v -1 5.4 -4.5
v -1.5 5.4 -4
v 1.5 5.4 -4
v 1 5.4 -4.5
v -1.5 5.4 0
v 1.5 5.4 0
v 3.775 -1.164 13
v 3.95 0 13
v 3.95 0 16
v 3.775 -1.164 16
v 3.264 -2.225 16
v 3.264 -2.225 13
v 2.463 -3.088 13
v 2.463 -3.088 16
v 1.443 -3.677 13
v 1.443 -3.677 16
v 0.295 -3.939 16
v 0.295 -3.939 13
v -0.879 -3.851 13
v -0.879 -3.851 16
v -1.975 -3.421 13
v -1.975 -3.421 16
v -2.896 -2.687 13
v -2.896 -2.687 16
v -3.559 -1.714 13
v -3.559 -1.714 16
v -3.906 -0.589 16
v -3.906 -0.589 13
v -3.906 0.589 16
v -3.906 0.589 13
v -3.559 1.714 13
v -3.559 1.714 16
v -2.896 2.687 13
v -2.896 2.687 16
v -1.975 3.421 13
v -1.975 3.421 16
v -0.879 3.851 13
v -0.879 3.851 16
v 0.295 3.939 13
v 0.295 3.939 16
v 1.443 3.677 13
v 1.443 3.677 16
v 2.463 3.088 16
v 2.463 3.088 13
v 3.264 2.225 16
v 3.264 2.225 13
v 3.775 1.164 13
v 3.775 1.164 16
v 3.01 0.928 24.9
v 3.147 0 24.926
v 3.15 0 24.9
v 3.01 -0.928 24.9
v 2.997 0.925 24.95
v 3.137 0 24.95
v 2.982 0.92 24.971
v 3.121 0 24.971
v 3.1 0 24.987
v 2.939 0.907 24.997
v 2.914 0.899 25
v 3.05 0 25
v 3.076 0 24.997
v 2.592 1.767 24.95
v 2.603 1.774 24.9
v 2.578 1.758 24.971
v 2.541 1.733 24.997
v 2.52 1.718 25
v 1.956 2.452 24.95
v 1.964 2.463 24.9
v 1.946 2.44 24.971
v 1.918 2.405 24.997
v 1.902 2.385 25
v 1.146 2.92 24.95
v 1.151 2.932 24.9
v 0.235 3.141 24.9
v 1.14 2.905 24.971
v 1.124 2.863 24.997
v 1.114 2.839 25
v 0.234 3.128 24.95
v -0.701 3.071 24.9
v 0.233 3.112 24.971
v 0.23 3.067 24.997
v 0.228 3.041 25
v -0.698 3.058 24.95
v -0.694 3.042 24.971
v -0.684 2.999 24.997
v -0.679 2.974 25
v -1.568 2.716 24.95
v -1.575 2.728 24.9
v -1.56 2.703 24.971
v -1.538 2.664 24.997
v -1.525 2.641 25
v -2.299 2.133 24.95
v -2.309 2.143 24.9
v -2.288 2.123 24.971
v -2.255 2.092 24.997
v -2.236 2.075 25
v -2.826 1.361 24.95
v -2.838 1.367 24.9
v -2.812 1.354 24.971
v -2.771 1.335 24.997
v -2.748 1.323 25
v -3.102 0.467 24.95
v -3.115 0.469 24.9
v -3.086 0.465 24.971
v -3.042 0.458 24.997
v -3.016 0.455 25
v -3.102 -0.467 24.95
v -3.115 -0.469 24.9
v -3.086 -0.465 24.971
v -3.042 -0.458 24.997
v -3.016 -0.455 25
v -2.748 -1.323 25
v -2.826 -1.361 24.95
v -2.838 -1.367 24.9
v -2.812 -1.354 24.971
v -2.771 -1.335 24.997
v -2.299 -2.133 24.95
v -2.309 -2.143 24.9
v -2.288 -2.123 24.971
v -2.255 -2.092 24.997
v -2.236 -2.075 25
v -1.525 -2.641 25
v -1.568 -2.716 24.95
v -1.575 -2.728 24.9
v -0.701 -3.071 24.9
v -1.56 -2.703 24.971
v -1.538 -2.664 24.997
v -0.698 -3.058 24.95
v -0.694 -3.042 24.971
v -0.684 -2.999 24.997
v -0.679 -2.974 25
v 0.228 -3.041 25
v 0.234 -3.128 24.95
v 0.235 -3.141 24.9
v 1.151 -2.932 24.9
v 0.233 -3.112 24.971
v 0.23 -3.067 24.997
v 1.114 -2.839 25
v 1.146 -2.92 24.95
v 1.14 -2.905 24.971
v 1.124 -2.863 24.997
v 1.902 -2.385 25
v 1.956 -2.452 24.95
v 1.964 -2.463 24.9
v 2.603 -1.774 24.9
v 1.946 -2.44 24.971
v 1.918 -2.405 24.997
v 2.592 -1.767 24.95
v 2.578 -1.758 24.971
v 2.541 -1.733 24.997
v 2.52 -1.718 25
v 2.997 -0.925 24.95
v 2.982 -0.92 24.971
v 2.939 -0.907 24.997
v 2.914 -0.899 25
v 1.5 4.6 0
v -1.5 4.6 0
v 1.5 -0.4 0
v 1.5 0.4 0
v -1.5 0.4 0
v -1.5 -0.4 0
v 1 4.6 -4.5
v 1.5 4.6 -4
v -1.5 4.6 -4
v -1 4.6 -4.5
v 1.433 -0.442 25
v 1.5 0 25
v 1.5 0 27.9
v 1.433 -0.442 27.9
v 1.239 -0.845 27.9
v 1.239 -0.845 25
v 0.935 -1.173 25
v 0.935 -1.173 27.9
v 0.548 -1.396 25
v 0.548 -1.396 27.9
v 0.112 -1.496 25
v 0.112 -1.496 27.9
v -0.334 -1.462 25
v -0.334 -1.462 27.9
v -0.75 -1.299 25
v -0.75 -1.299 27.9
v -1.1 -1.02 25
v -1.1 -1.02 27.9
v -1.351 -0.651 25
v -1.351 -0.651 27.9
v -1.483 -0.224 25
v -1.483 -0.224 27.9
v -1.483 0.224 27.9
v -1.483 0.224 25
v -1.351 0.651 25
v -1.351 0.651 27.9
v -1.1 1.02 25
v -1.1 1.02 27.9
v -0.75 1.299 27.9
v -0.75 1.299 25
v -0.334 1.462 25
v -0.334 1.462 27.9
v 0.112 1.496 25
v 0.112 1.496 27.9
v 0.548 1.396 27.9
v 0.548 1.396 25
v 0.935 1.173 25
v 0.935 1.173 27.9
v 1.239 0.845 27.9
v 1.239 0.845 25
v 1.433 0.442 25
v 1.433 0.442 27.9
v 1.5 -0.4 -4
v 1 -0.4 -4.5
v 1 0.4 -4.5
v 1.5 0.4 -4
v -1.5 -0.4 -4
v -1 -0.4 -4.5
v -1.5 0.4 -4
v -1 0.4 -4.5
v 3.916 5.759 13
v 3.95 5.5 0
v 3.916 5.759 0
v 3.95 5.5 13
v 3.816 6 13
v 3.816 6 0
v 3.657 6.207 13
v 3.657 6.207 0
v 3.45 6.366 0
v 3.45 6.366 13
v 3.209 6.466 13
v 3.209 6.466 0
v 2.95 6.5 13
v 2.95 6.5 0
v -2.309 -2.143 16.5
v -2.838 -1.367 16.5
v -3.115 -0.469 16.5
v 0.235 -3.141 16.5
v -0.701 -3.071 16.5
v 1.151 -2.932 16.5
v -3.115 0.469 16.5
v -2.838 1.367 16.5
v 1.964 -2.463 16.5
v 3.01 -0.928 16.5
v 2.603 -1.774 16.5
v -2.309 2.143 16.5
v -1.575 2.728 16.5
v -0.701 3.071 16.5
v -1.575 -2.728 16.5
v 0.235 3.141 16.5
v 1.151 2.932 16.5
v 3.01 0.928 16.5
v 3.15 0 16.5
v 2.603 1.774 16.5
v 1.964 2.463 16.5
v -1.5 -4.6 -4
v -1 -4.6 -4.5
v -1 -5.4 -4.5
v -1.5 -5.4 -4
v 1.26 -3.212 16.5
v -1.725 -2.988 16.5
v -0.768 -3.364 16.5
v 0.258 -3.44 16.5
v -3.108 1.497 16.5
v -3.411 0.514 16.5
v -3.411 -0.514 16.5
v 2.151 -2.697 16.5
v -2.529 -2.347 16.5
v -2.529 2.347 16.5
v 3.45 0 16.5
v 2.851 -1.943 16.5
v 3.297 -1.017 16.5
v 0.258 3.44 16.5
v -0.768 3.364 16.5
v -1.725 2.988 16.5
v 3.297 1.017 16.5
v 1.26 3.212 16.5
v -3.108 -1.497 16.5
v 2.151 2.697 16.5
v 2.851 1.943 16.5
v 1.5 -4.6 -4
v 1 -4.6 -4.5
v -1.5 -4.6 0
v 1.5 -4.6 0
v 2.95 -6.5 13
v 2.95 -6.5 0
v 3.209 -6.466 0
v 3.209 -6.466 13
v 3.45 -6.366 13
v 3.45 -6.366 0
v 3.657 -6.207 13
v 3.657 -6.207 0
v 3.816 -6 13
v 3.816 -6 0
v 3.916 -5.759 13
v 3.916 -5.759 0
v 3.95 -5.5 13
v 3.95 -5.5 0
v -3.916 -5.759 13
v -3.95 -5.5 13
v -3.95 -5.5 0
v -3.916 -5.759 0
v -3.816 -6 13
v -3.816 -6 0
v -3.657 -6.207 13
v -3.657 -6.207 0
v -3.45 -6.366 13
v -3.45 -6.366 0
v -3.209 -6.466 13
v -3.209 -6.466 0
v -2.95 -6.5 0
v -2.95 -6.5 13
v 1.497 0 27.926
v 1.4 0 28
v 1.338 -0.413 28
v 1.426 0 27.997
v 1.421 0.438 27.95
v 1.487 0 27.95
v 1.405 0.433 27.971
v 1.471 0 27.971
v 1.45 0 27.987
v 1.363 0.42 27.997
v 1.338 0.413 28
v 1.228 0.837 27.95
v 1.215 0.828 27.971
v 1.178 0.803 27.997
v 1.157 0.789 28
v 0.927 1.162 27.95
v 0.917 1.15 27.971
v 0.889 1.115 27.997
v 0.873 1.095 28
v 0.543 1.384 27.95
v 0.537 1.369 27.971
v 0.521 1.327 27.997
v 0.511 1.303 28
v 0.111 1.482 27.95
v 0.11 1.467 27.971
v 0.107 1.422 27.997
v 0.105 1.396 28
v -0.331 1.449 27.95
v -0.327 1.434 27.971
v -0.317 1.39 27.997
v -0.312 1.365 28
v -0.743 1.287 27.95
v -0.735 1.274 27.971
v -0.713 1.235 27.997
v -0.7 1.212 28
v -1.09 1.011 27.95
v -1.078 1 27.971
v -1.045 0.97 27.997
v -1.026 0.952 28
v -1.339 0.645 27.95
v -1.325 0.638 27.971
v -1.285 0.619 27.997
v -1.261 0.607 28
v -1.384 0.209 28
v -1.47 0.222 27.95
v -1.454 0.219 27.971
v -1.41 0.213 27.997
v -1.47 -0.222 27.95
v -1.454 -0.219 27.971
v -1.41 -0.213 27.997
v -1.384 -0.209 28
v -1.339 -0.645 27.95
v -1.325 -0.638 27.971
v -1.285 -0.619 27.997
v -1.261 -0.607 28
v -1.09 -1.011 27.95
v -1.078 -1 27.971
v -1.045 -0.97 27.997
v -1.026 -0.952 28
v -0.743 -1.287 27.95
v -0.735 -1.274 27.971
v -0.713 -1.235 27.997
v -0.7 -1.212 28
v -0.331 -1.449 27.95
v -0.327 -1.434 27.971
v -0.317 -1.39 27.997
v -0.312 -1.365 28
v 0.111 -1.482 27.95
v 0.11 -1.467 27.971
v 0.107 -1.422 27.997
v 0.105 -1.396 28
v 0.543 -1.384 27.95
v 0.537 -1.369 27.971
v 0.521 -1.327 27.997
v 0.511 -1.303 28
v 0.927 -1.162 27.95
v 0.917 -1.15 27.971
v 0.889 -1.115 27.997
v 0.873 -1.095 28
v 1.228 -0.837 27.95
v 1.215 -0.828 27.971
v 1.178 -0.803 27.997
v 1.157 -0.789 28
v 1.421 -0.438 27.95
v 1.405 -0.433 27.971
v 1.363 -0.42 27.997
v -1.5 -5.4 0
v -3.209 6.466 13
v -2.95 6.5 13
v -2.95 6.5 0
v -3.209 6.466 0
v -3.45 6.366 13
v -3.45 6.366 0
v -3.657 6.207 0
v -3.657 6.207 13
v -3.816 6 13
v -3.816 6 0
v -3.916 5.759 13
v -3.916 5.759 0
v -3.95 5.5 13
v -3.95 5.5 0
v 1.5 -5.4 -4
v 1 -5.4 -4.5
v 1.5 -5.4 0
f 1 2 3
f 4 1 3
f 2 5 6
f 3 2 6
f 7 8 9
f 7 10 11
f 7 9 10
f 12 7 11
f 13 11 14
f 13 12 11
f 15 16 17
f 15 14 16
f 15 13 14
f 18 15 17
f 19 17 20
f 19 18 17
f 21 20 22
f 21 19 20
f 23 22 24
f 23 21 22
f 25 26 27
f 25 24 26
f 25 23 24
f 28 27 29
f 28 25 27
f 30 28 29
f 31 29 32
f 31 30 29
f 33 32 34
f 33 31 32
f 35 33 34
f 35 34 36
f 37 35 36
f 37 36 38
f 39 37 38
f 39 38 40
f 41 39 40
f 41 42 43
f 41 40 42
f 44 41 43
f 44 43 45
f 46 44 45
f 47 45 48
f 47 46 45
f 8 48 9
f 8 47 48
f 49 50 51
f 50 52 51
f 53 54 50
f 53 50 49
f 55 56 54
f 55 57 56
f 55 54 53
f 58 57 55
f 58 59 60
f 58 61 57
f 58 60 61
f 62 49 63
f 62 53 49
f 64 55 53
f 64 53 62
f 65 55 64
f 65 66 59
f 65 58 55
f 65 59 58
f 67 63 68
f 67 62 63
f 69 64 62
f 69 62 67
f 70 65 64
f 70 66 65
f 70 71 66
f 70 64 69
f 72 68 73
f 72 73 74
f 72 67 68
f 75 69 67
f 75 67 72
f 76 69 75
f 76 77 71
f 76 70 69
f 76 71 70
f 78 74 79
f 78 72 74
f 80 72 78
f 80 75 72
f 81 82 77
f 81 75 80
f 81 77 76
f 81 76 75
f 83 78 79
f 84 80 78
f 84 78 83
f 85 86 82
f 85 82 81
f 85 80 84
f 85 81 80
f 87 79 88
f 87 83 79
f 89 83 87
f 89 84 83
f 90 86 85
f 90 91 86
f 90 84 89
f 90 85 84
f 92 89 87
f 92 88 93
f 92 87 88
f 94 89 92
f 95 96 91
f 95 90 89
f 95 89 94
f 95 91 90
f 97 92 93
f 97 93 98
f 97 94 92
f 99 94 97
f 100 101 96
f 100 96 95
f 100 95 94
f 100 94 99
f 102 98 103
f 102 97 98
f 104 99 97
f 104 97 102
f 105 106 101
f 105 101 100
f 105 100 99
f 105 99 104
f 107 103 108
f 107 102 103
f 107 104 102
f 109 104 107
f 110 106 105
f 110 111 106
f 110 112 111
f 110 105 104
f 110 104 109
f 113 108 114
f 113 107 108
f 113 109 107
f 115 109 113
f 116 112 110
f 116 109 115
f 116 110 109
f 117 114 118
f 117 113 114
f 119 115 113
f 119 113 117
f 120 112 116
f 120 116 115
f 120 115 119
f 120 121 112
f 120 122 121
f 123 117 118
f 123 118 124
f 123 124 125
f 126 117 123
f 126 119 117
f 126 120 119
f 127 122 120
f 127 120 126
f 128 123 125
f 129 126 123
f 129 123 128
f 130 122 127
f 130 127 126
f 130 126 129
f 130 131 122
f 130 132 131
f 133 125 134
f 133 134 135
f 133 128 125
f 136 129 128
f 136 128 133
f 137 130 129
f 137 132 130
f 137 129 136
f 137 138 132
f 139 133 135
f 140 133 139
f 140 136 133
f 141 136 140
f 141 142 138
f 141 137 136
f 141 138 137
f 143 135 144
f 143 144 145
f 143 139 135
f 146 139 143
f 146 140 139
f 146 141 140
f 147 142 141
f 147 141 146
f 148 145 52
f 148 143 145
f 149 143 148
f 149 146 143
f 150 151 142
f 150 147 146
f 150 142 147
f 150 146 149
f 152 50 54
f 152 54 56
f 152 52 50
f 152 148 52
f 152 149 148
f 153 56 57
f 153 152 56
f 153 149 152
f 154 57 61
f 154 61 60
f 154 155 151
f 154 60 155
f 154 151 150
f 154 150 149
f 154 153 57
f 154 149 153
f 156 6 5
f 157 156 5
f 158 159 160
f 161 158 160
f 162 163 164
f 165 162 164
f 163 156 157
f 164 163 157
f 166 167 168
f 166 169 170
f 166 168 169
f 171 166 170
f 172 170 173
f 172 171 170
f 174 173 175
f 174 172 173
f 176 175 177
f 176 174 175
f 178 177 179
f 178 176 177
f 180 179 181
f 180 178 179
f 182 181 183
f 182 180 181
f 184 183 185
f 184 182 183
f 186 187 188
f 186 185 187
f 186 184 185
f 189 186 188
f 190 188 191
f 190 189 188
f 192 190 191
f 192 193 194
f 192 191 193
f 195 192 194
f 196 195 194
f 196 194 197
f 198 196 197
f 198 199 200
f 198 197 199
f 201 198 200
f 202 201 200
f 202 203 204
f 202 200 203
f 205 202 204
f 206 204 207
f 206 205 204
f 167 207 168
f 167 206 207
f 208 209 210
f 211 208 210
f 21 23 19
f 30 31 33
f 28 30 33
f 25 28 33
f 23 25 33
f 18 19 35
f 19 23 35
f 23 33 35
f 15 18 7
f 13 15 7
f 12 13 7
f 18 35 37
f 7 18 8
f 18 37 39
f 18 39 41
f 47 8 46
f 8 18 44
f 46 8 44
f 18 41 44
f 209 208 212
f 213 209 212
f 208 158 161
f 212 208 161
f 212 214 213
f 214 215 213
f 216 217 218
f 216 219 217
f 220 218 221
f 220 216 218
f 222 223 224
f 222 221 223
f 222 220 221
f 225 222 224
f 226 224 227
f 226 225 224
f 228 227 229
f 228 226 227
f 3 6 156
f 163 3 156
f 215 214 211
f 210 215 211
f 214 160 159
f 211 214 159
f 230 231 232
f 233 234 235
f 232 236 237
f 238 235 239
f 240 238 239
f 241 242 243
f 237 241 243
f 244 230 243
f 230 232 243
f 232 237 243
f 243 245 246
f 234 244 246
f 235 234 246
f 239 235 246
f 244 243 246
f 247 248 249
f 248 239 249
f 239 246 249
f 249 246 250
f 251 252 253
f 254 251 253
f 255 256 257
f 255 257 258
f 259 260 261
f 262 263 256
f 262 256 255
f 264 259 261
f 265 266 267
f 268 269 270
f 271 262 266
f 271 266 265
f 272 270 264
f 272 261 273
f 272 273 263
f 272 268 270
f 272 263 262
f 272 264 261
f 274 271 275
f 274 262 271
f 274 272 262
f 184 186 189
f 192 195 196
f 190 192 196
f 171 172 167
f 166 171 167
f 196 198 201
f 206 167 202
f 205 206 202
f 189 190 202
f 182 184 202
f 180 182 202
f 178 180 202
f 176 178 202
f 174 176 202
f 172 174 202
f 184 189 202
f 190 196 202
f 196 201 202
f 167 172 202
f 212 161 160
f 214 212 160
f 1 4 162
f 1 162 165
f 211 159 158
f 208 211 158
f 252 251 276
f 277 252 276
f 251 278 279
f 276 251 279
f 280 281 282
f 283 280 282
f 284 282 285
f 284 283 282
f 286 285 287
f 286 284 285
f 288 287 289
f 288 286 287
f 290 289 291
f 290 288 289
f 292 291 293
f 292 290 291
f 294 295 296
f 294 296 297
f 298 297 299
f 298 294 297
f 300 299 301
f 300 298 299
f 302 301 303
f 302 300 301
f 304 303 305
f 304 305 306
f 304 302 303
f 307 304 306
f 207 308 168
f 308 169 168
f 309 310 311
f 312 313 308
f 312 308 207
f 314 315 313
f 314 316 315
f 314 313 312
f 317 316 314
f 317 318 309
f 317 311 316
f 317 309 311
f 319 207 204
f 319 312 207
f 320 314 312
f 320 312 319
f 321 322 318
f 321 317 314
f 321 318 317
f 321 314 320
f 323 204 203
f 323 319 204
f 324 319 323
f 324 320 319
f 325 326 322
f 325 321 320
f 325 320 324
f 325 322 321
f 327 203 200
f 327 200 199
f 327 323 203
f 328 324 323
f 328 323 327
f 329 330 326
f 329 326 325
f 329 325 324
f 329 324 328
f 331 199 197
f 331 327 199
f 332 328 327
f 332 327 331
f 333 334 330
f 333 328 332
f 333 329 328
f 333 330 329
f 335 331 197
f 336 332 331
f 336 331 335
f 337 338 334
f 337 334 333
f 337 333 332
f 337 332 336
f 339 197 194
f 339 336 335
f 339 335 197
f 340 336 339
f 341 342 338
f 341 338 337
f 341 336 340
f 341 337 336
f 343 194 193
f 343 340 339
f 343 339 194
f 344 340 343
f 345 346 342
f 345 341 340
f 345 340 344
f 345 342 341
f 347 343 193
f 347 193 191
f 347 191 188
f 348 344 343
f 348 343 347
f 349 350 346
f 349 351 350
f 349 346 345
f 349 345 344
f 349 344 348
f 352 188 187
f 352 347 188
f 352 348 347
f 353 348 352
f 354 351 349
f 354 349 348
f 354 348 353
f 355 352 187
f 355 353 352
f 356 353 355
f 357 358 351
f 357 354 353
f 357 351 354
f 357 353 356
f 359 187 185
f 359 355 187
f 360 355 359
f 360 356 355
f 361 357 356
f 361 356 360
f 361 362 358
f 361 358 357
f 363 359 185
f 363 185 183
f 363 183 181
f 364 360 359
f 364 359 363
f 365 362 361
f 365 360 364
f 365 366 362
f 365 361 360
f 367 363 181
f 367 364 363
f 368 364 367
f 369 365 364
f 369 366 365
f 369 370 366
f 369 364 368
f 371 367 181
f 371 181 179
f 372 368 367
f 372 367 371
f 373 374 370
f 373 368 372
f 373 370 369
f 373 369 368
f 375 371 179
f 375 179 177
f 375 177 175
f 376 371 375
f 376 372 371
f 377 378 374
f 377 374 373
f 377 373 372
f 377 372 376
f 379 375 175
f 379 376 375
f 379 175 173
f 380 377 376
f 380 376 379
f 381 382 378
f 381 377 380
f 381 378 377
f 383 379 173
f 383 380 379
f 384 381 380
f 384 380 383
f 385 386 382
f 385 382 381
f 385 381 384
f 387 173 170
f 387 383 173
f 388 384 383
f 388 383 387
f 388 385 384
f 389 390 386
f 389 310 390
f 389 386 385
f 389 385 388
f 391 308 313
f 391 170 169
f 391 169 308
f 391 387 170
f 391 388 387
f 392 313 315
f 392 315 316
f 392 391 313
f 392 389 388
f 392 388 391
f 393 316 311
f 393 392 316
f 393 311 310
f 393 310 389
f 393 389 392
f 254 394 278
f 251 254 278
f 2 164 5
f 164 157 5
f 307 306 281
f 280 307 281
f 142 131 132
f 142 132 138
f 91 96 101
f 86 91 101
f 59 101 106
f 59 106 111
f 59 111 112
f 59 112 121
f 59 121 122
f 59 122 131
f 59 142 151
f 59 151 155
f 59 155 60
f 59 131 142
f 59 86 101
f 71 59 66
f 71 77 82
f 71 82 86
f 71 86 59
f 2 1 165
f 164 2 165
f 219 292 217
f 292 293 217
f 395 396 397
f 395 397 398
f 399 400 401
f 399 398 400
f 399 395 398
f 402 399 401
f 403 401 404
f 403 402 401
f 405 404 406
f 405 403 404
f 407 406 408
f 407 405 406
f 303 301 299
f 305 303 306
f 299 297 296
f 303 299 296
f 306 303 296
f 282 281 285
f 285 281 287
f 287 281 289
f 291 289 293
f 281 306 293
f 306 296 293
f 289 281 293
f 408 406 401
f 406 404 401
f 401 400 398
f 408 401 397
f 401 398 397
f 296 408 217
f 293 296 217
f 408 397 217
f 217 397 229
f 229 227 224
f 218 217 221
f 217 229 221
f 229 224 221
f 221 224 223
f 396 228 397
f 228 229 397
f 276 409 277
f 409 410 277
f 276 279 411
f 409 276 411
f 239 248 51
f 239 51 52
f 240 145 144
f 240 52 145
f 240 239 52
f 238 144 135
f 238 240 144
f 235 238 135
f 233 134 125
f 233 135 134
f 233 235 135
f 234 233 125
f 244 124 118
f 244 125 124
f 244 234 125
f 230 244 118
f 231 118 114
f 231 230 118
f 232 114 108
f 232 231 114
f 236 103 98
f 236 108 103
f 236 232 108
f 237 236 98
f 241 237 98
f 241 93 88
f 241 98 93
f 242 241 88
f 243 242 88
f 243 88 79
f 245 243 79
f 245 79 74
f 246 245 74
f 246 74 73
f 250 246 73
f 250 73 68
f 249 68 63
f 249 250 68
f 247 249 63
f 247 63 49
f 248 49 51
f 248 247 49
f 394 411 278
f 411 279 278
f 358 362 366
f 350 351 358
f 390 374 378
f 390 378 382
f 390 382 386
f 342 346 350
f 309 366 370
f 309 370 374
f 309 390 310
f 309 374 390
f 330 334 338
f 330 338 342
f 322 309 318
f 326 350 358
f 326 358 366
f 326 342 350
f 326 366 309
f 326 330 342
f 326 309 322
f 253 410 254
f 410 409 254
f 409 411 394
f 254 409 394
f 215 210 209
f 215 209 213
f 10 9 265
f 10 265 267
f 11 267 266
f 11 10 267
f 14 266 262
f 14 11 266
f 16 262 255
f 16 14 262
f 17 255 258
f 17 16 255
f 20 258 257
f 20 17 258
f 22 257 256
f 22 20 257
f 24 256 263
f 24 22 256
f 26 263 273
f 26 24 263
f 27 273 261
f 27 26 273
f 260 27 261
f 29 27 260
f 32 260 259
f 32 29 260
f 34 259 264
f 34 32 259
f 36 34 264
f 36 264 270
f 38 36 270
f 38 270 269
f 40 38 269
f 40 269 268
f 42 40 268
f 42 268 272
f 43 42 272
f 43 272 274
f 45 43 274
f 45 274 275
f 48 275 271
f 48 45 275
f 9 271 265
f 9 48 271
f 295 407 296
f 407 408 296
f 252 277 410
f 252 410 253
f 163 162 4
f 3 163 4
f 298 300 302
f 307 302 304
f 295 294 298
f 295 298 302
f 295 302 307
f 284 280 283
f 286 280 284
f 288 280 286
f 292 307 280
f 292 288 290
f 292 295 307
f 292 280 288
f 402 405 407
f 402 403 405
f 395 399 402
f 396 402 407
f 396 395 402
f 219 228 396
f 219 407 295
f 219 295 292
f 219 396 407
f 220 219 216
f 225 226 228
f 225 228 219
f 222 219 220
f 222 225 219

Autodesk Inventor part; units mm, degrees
ref_plane "YZ Plane" through (0, 0, 0) normal (1, 0, 0) x (0, 1, 0)
ref_plane "XZ Plane" through (0, 0, 0) normal (0, 1, 0) x (-1, 0, 0)
ref_plane "XY Plane" through (0, 0, 0) normal (0, 0, 1) x (1, 0, 0)
sketch "Sketch1" plane through (0, 0, 0) normal (0, 0, 1) x (1, 0, 0)
  line L0 (-3.95, -6.5) -> (3.95, -6.5)
  line L1 (3.95, -6.5) -> (3.95, 6.5)
  line L2 (3.95, 6.5) -> (-3.95, 6.5)
  line L3 (-3.95, 6.5) -> (-3.95, -6.5)
  line L4 (-3.95, -6.5) -> (3.95, 6.5) construction
  line L5 (3.95, -6.5) -> (-3.95, 6.5) construction
  point P0 (0, 0)
  dimension "d0" = 13
  dimension "d1" = 7.9
sketch "Sketch1 outline for Extrusion1" plane through (0, 0, 0) normal (0, 0, 1) x (1, 0, 0)
  line L0 (-3.95, -6.5) -> (3.95, -6.5)
  line L1 (-3.95, 6.5) -> (-3.95, -6.5)
  line L2 (3.95, 6.5) -> (-3.95, 6.5)
  line L3 (3.95, -6.5) -> (3.95, 6.5)
extrude "Extrusion1" add sketch "Sketch1 outline for Extrusion1" along normal blind 13
sketch "Sketch2" plane through (0, 0, 0) normal (0, 0, -1) x (-1, 0, 0)
  line L0 (0, -9.1) -> (0, 9.1) projected
  line L1 (-1.5, -5.4) -> (1.5, -5.4)
  line L2 (1.5, -5.4) -> (1.5, -4.6)
  line L3 (1.5, -4.6) -> (-1.5, -4.6)
  line L4 (-1.5, -4.6) -> (-1.5, -5.4)
  line L5 (-1.5, -5.4) -> (1.5, -4.6) construction
  line L6 (1.5, -5.4) -> (-1.5, -4.6) construction
  line L7 (-1.5, -0.4) -> (1.5, -0.4)
  line L8 (1.5, -0.4) -> (1.5, 0.4)
  line L9 (1.5, 0.4) -> (-1.5, 0.4)
  line L10 (-1.5, 0.4) -> (-1.5, -0.4)
  line L11 (-1.5, -0.4) -> (1.5, 0.4) construction
  line L12 (1.5, -0.4) -> (-1.5, 0.4) construction
  line L13 (-1.5, 4.6) -> (1.5, 4.6)
  line L14 (1.5, 4.6) -> (1.5, 5.4)
  line L15 (1.5, 5.4) -> (-1.5, 5.4)
  line L16 (-1.5, 5.4) -> (-1.5, 4.6)
  line L17 (-1.5, 4.6) -> (1.5, 5.4) construction
  line L18 (1.5, 4.6) -> (-1.5, 5.4) construction
  line L19 (-3.95, 6.5) -> (3.95, 6.5) projected
  line L20 (3.95, -6.5) -> (-3.95, -6.5) projected
  point P0 (0, 0)
  point P1 (0, -5)
  point P2 (0, 5)
  dimension "d4" = 1.5
  dimension "d5" = 1.5
  dimension "d6" = 0.8
  dimension "d7" = 0.8
  dimension "d8" = 0.8
  dimension "d9" = 3
sketch "Sketch2 outline for Extrusion2" plane through (0, 0, 0) normal (0, 0, -1) x (-1, 0, 0)
  line L0 (-1.5, -4.6) -> (-1.5, -5.4)
  line L1 (1.5, -4.6) -> (-1.5, -4.6)
  line L2 (1.5, -5.4) -> (1.5, -4.6)
  line L3 (-1.5, -5.4) -> (1.5, -5.4)
  line L4 (-1.5, 0.4) -> (-1.5, -0.4)
  line L5 (1.5, 0.4) -> (-1.5, 0.4)
  line L6 (1.5, -0.4) -> (1.5, 0.4)
  line L7 (-1.5, -0.4) -> (1.5, -0.4)
  line L8 (-1.5, 5.4) -> (-1.5, 4.6)
  line L9 (1.5, 5.4) -> (-1.5, 5.4)
  line L10 (1.5, 4.6) -> (1.5, 5.4)
  line L11 (-1.5, 4.6) -> (1.5, 4.6)
extrude "Extrusion2" add sketch "Sketch2 outline for Extrusion2" along normal blind 4.5 separate body
sketch "Sketch3" plane through (0, 0, 13) normal (0, 0, 1) x (1, 0, 0)
  circle A0 centre (0, 0) radius 3.95
  line L0 (-3.95, 6.5) -> (-3.95, -6.5) projected
sketch "Sketch3 outline for Extrusion3" plane through (0, 0, 13) normal (0, 0, 1) x (1, 0, 0)
  circle A0 centre (0, 0) radius 3.95
extrude "Extrusion3" add sketch "Sketch3 outline for Extrusion3" along normal blind 3.5 separate body
sketch "Sketch4" plane through (0, 0, 16.5) normal (0, 0, 1) x (1, 0, 0)
  circle A0 centre (0, 0) radius 3.15
  dimension "d15" = 6.3
sketch "Sketch4 outline for Extrusion4" plane through (0, 0, 16.5) normal (0, 0, 1) x (1, 0, 0)
  circle A0 centre (0, 0) radius 3.15
extrude "Extrusion4" add sketch "Sketch4 outline for Extrusion4" along normal blind 8.5 separate body
sketch "Sketch5" plane through (0, 0, 25) normal (0, 0, 1) x (1, 0, 0)
  circle A0 centre (0, 0) radius 1.5
  dimension "d18" = 3
sketch "Sketch5 outline for Extrusion5" plane through (0, 0, 25) normal (0, 0, 1) x (1, 0, 0)
  circle A0 centre (0, 0) radius 1.5
extrude "Extrusion5" add sketch "Sketch5 outline for Extrusion5" along normal blind 3 separate body
chamfer "Chamfer1" distance 0.5 angle 45 1 edges at (-3.95, 0, 16.5)
fillet "Fillet1" radius 1 4 edges at (3.95, 6.5, 6.5) (-3.95, 6.5, 6.5) (-3.95, -6.5, 6.5) (3.95, -6.5, 6.5)
chamfer "Chamfer2" distance 0.5 angle 45 6 edges at (-1.5, -5, -4.5) (-1.5, 0, -4.5) (-1.5, 5, -4.5) (1.5, 5, -4.5) (1.5, 0, -4.5) (1.5, -5, -4.5)
fillet "Fillet2" radius 0.1 1 edges at (-1.5, 0, 28)
fillet "Fillet3" radius 0.1 1 edges at (-3.15, 0, 25)
equation "\"d5\" = d4"
equation "\"d7\" = d6"
equation "\"d8\" = d7"
properties part number "MB2011SD3G01-CA"
